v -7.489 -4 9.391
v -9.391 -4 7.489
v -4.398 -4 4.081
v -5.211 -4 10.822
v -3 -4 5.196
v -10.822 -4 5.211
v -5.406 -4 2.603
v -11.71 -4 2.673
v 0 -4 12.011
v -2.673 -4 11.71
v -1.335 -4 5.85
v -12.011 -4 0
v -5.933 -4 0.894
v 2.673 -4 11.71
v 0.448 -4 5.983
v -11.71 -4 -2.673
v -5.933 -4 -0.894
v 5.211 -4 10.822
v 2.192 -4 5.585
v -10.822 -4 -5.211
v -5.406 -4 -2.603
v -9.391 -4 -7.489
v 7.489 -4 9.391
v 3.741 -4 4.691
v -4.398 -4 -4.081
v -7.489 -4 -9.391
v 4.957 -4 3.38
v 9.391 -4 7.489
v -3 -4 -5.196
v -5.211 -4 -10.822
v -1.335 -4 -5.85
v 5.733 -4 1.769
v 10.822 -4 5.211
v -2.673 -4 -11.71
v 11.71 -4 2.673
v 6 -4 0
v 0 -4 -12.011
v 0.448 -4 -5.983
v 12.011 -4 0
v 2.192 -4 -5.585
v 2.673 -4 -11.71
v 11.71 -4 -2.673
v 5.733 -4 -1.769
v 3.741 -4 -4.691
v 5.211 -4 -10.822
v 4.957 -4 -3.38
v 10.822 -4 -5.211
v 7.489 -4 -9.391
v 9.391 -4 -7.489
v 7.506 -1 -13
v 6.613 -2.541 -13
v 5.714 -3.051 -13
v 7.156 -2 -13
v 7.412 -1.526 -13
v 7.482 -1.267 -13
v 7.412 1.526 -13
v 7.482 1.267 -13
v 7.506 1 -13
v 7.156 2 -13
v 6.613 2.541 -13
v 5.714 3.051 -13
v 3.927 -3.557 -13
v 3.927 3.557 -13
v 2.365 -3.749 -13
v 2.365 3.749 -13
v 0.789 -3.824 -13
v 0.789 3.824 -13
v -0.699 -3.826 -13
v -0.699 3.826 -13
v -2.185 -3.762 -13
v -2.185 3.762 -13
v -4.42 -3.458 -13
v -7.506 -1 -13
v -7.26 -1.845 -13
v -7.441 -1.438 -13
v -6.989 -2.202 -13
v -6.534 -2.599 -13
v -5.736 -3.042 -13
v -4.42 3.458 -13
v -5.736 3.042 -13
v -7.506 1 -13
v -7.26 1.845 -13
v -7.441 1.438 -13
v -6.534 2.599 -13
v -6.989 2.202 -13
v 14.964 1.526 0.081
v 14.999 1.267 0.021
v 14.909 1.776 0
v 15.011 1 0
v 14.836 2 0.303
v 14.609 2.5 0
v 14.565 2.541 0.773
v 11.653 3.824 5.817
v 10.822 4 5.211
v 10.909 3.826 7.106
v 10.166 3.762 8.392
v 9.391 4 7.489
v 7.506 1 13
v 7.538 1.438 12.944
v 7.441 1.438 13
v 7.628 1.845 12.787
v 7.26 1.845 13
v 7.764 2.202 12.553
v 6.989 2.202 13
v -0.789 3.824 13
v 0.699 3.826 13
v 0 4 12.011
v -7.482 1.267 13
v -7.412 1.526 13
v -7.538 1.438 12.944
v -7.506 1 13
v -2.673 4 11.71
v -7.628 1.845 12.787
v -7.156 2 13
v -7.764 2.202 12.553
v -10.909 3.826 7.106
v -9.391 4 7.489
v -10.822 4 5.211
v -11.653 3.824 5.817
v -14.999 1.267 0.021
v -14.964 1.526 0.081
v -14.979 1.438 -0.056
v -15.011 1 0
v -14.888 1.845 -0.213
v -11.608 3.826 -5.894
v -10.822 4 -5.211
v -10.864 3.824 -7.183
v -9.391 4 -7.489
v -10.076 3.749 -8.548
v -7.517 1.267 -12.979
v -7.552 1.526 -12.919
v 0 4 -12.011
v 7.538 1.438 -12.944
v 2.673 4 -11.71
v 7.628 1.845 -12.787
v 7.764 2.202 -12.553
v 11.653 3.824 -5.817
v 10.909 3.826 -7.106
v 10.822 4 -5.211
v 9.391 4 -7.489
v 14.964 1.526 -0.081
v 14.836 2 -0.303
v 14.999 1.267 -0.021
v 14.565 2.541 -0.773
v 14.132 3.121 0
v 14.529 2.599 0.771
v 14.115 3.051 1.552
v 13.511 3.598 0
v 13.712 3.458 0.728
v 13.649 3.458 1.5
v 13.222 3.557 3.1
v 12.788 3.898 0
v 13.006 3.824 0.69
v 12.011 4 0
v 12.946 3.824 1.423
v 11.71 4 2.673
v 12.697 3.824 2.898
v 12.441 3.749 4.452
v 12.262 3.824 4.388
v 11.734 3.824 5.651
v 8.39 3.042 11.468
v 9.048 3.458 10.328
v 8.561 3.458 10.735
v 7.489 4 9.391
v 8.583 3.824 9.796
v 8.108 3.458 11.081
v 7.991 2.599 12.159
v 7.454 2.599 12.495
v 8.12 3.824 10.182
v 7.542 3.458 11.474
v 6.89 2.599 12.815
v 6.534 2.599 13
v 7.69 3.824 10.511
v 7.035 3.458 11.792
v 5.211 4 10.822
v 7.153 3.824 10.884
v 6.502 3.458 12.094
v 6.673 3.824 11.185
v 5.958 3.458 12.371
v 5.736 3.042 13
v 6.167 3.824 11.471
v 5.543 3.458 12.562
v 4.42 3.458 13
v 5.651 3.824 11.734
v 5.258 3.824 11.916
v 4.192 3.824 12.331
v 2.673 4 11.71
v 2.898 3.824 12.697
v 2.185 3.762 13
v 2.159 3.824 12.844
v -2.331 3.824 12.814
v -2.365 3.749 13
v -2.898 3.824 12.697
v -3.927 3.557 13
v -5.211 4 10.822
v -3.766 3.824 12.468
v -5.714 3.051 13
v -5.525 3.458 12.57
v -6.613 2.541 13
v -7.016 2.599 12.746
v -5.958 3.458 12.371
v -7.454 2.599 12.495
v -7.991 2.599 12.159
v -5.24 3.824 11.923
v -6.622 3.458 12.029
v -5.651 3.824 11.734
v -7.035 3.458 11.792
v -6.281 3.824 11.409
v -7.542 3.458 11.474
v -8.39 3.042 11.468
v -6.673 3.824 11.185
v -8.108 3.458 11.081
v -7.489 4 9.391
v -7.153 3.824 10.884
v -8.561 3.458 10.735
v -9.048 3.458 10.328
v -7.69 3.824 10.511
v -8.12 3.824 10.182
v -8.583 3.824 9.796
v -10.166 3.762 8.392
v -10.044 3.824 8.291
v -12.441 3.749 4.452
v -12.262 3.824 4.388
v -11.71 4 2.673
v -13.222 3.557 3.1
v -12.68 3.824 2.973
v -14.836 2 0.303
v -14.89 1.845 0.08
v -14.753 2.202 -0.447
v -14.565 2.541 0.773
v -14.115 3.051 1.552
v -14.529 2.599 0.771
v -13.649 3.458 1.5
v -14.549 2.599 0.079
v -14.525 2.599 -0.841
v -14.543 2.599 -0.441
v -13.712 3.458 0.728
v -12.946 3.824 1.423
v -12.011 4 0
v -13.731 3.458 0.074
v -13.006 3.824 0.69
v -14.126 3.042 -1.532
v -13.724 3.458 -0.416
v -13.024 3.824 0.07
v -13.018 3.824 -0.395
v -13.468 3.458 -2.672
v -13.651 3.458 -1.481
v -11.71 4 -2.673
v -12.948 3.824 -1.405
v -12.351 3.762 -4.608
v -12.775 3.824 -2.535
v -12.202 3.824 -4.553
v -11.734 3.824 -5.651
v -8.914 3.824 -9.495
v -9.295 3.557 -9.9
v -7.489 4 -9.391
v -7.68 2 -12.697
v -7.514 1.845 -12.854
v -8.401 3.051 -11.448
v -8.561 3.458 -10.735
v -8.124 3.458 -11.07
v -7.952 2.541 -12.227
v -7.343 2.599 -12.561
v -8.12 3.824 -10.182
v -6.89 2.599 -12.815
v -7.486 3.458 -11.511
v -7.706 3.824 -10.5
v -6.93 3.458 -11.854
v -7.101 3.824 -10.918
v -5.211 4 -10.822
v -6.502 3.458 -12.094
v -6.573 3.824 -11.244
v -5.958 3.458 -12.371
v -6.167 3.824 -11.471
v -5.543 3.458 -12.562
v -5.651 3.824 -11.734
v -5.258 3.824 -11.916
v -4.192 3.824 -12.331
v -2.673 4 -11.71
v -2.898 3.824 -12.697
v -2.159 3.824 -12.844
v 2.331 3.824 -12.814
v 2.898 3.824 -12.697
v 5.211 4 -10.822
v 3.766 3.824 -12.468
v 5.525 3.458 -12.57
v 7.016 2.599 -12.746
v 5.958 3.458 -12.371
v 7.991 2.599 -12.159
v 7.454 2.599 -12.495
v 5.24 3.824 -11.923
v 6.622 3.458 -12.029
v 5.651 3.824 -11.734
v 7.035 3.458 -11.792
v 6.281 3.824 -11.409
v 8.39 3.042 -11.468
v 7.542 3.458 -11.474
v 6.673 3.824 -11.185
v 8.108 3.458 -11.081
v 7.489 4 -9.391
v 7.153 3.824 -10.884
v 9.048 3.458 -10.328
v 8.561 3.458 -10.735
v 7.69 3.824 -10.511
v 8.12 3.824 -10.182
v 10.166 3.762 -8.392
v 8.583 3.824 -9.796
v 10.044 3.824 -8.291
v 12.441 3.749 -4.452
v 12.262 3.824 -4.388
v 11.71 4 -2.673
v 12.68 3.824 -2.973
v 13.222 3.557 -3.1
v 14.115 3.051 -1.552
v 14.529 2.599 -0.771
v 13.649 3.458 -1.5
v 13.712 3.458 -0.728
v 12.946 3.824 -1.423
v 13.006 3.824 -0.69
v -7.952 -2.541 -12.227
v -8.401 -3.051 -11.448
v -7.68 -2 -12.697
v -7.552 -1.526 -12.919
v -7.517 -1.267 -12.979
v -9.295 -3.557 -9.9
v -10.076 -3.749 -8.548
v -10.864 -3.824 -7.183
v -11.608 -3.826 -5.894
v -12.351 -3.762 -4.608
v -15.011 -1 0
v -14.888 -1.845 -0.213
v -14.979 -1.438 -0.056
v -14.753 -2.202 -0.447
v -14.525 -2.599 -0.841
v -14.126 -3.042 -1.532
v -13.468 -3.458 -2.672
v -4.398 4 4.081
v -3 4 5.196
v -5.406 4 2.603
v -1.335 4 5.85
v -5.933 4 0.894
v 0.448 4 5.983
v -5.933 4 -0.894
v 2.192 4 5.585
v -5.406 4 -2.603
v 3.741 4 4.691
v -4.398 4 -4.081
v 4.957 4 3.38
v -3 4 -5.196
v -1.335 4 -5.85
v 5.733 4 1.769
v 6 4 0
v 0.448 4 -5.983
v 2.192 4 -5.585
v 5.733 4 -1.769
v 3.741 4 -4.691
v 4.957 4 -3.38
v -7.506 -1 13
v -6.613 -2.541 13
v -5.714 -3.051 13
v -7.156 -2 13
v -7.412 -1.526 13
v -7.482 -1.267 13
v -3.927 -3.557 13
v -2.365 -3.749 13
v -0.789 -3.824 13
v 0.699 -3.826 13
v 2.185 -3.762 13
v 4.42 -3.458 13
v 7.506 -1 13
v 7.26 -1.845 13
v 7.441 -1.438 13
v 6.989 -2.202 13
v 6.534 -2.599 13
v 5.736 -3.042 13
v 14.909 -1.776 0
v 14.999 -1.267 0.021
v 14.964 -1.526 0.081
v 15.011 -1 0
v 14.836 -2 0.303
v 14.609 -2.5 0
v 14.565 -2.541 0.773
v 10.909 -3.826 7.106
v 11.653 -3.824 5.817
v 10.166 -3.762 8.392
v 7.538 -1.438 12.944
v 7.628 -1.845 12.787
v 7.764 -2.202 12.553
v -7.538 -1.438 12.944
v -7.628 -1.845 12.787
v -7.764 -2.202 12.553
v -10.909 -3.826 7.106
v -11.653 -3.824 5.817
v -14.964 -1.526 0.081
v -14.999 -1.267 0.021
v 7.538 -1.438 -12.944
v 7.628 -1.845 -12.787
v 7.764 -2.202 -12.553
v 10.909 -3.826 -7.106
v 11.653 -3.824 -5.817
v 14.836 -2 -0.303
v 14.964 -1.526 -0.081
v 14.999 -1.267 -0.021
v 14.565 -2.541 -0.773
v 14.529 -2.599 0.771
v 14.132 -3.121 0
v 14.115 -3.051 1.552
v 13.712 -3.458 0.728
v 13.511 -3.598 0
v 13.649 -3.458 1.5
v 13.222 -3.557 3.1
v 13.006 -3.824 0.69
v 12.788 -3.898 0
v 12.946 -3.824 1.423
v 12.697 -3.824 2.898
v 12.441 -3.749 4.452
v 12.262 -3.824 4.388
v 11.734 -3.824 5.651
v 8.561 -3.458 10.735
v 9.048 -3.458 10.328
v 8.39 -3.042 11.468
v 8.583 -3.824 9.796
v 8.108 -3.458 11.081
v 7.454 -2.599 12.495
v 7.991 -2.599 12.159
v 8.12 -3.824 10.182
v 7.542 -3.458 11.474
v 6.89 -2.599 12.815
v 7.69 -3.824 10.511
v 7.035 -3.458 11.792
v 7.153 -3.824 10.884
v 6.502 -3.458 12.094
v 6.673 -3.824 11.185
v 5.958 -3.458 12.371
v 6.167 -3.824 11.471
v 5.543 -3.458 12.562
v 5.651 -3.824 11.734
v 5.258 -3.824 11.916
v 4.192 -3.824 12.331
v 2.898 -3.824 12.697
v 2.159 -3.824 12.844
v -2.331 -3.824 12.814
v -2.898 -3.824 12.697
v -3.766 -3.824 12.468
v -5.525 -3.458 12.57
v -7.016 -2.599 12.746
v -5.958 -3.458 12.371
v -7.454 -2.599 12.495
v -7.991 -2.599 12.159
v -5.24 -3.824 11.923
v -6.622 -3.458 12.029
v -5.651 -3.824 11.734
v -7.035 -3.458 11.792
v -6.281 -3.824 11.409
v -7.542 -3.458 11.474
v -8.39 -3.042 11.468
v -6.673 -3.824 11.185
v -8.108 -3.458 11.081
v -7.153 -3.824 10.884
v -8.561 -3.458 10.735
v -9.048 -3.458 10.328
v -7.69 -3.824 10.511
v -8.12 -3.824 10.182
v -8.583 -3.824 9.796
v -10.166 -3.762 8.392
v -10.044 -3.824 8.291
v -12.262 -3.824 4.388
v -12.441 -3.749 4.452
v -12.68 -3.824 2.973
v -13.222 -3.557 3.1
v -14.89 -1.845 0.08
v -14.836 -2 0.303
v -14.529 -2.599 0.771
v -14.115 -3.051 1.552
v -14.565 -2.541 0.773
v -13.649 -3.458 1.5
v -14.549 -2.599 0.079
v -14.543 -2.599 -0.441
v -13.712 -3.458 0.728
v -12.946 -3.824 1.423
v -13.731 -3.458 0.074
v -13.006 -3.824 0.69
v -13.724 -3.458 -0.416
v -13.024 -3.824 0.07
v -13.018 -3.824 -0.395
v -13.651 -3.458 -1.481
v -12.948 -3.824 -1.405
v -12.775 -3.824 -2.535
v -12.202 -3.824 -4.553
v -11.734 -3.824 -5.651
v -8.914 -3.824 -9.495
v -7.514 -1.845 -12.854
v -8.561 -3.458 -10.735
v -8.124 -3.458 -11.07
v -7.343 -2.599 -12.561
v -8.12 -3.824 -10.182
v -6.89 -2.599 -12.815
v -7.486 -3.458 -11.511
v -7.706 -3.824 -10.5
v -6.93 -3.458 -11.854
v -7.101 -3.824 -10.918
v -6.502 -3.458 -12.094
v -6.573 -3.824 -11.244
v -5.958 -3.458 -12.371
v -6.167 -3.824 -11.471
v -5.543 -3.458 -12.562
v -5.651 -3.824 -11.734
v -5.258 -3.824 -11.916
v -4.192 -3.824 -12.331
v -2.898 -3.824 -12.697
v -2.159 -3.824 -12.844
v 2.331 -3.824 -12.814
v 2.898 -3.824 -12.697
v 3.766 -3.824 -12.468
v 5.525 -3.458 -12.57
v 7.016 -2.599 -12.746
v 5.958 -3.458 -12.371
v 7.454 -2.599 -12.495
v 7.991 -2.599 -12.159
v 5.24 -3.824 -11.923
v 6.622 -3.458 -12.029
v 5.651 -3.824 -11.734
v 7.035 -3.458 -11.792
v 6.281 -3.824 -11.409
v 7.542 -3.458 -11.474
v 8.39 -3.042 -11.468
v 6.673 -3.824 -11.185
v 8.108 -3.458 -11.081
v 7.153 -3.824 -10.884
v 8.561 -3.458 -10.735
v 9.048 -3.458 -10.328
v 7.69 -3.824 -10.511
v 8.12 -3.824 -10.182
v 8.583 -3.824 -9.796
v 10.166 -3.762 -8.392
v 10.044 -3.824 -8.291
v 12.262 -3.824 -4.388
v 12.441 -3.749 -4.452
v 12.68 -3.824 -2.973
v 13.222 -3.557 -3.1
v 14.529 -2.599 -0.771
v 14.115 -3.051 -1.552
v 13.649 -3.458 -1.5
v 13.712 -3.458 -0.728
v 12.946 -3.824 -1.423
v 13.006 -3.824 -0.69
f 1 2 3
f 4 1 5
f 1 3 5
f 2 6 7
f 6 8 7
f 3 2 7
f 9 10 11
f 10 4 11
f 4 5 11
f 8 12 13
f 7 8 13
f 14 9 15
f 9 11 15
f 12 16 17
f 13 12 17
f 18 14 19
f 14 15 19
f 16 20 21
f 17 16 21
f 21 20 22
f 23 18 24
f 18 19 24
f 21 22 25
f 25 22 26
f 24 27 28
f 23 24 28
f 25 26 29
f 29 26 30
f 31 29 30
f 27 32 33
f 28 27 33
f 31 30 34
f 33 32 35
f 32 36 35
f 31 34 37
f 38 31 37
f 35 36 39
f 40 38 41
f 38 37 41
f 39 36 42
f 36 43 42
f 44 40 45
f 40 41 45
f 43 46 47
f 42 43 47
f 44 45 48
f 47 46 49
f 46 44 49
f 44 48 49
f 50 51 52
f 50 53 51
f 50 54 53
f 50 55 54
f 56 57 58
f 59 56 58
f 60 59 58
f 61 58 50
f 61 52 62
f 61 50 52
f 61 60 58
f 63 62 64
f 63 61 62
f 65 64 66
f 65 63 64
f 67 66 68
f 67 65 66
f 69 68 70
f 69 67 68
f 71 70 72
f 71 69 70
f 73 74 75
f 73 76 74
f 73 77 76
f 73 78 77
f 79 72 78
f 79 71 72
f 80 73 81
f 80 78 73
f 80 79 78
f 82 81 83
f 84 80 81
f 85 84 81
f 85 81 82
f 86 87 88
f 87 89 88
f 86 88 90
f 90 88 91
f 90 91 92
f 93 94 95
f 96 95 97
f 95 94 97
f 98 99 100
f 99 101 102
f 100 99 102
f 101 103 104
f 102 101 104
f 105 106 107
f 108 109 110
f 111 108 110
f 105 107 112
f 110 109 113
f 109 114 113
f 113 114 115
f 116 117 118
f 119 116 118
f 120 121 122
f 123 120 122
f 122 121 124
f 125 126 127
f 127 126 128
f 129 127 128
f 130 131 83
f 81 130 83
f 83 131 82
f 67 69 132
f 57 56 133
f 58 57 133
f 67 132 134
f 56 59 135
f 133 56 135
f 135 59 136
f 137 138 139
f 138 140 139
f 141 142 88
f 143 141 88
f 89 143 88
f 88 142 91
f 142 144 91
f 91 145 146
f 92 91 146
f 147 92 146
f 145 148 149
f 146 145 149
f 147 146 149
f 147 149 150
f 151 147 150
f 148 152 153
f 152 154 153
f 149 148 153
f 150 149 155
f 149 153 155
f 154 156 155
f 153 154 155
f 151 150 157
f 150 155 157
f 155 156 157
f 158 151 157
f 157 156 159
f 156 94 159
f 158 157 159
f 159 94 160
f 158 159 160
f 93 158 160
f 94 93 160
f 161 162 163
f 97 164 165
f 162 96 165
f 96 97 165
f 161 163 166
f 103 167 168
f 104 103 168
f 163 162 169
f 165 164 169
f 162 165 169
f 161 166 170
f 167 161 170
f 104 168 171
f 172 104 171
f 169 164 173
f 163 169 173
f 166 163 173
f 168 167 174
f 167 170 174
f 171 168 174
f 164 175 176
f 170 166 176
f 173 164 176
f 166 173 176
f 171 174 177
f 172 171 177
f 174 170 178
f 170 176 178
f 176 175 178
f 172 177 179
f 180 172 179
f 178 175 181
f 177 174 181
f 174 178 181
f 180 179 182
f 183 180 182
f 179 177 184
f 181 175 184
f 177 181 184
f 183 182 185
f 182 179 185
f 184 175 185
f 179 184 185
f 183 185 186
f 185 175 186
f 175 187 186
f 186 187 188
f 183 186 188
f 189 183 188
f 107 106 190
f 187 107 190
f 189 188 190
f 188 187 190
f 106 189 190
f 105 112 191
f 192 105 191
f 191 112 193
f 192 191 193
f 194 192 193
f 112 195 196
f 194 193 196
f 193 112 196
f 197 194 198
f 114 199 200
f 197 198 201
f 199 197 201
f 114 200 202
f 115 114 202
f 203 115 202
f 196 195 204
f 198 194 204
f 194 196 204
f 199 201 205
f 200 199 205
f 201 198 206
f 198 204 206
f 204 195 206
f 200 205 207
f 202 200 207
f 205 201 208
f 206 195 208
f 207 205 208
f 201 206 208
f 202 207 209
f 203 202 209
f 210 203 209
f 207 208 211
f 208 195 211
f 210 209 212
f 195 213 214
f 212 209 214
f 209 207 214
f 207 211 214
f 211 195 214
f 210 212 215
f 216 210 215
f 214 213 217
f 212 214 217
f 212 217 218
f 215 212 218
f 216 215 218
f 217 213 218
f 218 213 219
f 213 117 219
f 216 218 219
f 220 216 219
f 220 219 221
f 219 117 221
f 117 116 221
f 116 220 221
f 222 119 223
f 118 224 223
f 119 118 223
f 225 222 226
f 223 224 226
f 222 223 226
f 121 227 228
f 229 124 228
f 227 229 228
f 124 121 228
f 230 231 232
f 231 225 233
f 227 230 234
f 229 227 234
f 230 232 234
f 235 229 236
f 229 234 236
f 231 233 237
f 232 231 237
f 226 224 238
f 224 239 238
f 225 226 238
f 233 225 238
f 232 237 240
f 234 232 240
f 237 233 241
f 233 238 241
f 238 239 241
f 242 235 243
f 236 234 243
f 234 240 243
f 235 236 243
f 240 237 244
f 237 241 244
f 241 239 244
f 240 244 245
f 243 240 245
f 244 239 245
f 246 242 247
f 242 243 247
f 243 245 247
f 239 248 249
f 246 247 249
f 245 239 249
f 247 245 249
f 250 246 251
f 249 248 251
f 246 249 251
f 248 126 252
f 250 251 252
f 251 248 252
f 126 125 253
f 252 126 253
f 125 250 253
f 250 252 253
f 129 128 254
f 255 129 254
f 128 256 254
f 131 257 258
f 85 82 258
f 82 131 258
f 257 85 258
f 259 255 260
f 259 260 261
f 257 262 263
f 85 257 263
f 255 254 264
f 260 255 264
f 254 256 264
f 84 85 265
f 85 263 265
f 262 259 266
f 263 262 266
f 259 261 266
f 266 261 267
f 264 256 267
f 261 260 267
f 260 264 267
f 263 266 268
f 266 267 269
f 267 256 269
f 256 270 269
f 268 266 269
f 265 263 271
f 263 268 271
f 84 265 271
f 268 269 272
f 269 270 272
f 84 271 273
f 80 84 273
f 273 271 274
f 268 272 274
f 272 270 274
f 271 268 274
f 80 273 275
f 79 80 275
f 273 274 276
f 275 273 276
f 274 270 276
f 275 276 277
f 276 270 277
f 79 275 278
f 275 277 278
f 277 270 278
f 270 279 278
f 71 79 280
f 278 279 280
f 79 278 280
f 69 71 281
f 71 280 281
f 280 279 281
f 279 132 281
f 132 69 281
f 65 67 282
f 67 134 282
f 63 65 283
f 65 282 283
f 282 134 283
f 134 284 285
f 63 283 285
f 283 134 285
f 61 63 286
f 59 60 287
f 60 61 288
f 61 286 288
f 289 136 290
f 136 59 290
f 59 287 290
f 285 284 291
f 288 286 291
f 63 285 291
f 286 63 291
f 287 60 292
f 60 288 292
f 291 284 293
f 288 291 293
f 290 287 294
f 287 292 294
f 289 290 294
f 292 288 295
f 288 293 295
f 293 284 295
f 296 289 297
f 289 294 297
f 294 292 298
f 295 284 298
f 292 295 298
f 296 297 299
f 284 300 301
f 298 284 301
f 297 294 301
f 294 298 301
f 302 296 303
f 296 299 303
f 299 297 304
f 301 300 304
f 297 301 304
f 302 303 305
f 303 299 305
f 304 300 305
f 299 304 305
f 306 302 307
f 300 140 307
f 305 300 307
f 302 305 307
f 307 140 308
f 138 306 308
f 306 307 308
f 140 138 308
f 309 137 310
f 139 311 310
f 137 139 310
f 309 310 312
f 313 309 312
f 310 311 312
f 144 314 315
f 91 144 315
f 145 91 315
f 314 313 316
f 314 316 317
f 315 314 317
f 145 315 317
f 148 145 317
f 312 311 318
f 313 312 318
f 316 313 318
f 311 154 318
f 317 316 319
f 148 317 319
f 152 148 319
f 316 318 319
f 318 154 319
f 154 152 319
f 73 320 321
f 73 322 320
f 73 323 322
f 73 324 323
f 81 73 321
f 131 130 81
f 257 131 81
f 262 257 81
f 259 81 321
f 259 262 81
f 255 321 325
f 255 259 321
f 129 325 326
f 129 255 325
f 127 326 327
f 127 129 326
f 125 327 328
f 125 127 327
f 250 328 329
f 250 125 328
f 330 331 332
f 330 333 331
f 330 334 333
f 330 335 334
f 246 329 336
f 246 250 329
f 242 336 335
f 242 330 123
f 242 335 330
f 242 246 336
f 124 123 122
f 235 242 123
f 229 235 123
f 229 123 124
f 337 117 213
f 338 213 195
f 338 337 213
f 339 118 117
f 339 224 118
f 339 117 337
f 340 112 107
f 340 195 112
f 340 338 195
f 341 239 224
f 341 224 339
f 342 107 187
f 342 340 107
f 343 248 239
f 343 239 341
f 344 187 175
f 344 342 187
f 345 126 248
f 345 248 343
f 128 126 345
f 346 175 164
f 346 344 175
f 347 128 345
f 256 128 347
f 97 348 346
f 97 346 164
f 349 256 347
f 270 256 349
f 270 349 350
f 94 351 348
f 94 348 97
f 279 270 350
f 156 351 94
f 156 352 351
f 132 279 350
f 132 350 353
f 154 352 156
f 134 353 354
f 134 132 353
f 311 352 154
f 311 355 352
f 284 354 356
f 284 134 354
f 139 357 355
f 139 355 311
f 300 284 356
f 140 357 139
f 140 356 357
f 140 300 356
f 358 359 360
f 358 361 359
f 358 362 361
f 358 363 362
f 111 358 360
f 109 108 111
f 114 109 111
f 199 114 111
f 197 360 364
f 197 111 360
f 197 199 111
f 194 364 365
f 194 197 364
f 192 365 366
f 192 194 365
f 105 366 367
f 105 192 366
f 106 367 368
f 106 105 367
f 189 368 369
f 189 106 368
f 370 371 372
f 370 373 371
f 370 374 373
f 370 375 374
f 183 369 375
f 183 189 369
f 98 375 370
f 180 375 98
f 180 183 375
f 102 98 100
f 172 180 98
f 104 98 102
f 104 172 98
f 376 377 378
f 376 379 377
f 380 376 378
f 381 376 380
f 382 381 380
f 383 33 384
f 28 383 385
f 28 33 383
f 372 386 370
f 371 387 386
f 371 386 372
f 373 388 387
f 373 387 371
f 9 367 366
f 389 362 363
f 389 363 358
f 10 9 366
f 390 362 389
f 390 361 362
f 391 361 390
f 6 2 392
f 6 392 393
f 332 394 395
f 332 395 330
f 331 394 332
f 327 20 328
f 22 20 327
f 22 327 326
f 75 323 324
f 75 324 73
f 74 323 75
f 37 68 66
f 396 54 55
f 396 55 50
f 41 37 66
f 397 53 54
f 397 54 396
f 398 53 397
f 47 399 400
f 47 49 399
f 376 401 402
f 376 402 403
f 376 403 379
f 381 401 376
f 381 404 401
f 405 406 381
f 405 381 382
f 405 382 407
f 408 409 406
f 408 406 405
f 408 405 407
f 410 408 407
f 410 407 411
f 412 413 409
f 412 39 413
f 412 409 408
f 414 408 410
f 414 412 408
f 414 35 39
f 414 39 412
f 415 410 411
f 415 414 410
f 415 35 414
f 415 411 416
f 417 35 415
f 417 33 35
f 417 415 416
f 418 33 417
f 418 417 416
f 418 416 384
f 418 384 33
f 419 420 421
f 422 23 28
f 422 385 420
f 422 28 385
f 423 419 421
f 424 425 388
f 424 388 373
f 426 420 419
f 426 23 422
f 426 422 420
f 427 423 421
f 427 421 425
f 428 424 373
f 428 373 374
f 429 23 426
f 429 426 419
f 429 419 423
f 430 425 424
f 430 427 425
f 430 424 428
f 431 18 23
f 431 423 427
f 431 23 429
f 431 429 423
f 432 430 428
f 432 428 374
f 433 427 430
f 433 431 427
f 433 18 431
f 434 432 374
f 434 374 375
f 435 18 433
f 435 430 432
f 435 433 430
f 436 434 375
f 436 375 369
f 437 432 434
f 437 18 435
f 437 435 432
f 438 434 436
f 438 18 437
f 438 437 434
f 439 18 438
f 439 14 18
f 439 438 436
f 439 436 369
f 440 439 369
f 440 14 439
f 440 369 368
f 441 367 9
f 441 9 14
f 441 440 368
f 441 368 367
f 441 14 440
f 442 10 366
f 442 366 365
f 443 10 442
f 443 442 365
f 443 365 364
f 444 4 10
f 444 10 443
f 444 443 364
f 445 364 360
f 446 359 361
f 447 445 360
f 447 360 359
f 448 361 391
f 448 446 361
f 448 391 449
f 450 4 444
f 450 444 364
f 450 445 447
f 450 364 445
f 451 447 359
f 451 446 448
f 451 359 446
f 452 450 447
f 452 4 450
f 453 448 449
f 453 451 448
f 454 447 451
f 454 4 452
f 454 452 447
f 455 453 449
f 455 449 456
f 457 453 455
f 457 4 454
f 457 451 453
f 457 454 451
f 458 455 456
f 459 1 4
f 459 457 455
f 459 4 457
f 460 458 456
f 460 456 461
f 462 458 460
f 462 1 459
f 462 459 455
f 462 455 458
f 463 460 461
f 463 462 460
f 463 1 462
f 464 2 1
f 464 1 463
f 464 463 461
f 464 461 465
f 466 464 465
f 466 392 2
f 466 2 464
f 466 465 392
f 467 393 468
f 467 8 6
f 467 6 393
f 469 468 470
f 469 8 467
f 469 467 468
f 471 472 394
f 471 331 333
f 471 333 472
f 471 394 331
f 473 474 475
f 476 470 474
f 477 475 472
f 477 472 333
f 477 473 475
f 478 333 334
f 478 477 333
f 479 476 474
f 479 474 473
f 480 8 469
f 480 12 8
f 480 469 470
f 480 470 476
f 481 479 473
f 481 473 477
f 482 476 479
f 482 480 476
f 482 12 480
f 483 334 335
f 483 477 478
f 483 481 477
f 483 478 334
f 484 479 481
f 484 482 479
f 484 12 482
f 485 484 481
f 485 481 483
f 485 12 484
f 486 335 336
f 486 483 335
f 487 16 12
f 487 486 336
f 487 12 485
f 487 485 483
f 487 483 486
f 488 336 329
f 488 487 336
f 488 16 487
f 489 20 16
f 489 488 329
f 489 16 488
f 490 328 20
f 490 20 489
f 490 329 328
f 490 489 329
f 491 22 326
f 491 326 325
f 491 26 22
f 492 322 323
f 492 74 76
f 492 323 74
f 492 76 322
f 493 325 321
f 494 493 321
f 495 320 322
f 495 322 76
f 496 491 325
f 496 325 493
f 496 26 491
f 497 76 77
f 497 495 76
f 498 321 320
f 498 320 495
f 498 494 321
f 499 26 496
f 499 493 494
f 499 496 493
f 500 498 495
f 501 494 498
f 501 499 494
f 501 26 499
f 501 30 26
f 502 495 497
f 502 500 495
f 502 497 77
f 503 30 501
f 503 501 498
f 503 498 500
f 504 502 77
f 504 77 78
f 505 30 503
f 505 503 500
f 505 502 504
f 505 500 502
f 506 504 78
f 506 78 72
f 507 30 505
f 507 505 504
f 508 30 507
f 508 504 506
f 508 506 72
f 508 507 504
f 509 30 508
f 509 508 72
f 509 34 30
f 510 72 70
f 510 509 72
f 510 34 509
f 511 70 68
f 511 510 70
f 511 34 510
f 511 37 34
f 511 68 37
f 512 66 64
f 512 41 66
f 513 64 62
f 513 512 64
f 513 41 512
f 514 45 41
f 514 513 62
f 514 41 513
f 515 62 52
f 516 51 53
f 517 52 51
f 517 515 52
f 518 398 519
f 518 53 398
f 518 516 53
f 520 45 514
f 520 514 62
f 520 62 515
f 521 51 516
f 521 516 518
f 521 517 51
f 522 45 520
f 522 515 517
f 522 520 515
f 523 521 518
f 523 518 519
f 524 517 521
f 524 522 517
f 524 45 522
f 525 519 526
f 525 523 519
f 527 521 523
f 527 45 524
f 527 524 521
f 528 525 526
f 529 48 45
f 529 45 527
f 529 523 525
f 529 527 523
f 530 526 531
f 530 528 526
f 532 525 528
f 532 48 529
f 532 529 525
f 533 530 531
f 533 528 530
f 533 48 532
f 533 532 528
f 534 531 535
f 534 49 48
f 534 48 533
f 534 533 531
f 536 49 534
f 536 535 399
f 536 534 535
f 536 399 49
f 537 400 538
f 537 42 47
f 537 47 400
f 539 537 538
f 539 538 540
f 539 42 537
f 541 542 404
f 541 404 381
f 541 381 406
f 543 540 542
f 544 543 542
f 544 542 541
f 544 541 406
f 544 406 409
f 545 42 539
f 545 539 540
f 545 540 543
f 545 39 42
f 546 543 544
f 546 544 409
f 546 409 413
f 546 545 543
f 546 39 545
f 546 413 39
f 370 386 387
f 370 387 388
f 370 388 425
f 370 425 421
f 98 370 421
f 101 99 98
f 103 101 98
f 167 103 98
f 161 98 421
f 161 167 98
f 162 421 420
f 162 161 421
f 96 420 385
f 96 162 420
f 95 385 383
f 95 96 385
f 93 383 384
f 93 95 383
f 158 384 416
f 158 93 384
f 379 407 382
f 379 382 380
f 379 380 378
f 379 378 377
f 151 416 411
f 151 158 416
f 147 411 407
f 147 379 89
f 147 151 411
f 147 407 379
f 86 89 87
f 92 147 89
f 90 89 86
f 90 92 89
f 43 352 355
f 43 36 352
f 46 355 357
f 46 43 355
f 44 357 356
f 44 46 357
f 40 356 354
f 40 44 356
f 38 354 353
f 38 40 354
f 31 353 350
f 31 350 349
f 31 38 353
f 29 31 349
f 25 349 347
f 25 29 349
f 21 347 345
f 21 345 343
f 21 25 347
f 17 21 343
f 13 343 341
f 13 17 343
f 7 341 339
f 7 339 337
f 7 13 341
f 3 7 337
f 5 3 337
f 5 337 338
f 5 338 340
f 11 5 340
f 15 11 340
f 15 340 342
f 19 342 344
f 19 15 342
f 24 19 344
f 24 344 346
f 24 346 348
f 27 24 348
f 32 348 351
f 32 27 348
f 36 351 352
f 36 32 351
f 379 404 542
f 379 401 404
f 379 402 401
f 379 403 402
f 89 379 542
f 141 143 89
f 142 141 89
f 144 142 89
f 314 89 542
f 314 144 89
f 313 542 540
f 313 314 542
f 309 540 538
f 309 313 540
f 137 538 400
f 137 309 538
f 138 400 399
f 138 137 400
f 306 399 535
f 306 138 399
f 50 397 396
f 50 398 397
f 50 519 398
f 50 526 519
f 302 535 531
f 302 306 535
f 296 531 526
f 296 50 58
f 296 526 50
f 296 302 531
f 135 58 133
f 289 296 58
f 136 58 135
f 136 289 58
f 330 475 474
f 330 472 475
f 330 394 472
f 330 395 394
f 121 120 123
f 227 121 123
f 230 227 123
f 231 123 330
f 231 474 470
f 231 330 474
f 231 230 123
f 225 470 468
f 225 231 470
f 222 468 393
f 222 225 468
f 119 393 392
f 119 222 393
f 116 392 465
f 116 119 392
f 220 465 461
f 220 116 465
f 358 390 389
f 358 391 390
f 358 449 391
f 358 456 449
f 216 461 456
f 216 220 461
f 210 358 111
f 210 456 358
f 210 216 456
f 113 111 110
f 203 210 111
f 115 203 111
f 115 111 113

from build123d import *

# Parameters (mm, degrees)
SKETCH1_R           = 6
BOSS_EXTRUDE1_DEPTH = 4


with BuildPart() as part:
    # Sketch1 → Boss-Extrude1 (new body, symmetric)
    with BuildSketch(Plane(origin=(0, 0, 0), x_dir=(1, 0, 0), z_dir=(0, 1, 0))):
        Polygon((15.011106999, 0), (7.505553499, 13), (-7.505553499, 13), (-15.011106999, 0), (-7.505553499, -13), (7.505553499, -13), align=None)
        Circle(SKETCH1_R, mode=Mode.SUBTRACT)
    extrude(amount=BOSS_EXTRUDE1_DEPTH, both=True)

    # Sketch2 → Cut-Revolve1 (revolve, cut)
    with BuildSketch(Plane.XY):
        with BuildLine():
            Line((15.011106999, 4), (15.011106999, 1))
            ThreePointArc((15.011106999, 1), (14.132427342, 3.121320344), (12.011106999, 4))
            Line((12.011106999, 4), (15.011106999, 4))
        make_face()
    cut_revolve1 = revolve(axis=Axis((0, 0, 0), (0, -1, 0)), mode=Mode.SUBTRACT)

    # Mirror1: Cut-Revolve1 across plane
    add(cut_revolve1.mirror(Plane.ZX), mode=Mode.SUBTRACT)


solid = part.part
